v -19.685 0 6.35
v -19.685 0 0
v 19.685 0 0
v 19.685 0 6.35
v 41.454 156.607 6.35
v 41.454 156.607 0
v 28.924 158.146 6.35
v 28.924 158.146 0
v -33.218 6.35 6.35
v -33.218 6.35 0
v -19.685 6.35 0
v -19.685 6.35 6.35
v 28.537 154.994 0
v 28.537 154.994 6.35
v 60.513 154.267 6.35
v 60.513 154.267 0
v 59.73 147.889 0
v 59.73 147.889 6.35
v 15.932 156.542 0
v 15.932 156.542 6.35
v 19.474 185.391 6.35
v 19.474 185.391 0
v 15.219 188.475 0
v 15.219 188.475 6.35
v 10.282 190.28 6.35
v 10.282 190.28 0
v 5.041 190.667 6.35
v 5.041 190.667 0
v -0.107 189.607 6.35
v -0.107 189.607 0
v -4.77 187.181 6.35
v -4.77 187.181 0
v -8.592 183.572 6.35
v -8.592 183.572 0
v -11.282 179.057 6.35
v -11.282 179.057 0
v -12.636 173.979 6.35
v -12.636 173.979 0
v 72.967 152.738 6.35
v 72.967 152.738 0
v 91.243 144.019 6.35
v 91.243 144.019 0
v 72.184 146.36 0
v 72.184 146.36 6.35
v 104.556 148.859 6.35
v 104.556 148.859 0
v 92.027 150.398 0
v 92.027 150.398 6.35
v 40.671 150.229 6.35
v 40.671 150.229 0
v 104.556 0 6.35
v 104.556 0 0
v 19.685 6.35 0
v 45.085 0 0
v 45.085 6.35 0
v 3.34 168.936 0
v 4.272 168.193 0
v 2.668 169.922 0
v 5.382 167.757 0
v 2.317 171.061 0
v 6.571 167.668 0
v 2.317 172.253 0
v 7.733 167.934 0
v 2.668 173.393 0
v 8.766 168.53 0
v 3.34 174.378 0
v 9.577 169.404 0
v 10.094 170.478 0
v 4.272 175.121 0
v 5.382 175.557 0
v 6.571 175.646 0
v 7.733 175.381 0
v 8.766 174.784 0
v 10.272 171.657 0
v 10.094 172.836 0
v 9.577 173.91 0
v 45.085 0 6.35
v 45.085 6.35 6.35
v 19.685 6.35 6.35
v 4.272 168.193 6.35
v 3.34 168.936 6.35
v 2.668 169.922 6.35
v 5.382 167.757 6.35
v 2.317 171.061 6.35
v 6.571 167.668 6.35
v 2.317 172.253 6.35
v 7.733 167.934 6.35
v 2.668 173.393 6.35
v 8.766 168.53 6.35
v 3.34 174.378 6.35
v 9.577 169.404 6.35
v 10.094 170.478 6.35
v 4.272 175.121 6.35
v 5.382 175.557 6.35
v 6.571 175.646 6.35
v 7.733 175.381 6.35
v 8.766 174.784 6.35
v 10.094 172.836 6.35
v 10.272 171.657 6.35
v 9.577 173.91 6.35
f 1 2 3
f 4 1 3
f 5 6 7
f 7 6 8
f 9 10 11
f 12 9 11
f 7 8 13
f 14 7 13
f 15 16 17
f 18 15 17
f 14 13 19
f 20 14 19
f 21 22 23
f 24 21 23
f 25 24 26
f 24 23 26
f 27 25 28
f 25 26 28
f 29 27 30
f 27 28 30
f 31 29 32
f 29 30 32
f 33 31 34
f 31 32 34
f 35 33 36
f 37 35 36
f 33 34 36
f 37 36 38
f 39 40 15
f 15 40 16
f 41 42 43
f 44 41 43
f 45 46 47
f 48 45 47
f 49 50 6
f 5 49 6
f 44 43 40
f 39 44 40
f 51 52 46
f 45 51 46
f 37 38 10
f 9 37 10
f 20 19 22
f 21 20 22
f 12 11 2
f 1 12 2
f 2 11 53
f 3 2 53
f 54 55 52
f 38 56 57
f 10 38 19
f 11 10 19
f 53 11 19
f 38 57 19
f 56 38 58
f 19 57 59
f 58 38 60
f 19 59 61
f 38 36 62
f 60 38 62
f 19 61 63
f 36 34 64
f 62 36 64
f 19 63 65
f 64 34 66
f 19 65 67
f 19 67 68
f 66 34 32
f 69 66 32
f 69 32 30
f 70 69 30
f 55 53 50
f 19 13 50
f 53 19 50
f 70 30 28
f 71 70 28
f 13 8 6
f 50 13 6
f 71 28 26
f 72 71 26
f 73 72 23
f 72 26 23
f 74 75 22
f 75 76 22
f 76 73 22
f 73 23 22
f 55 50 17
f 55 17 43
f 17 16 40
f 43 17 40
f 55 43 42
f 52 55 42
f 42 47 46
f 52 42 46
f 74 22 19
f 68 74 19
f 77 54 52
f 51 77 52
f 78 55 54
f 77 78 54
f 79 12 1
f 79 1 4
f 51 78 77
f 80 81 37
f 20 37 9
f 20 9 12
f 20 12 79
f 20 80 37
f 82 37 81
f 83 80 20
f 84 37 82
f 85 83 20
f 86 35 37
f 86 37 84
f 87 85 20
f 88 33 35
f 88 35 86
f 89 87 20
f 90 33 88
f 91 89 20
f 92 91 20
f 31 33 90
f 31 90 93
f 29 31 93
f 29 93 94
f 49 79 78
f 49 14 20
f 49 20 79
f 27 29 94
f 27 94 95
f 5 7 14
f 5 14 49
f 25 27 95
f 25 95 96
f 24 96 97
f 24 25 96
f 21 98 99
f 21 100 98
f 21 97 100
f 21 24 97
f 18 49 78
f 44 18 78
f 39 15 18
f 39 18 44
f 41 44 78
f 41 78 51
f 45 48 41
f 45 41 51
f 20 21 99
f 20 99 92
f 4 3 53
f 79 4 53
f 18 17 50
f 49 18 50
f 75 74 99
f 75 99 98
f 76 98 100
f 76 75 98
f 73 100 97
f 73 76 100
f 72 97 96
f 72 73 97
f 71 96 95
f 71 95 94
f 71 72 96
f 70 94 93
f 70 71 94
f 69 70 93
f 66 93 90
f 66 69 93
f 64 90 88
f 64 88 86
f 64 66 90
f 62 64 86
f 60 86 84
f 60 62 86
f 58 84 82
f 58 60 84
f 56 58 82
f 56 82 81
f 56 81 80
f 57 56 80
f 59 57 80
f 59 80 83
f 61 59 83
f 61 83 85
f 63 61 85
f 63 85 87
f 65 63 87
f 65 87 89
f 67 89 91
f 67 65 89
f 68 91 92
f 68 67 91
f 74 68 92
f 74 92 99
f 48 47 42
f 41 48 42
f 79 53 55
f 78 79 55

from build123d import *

# Parameters (mm, degrees)
SKETCH1_R           = 4
BOSS_EXTRUDE1_DEPTH = 6.35


with BuildPart() as part:
    # Sketch1 → Boss-Extrude1 (new body)
    with BuildSketch(Plane.XY):
        with BuildLine():
            Line((15.931937103, 156.542159914), (19.474069569, 185.390513812))
            ThreePointArc((19.474069569, 185.390513812), (-0.107426276, 189.607166129), (-12.636025926, 173.978688048))
            Line((-12.636025926, 173.978688048), (-33.218240783, 6.35))
            Line((-33.218240783, 6.35), (-19.685, 6.35))
            Line((-19.685, 6.35), (-19.685, 0))
            Line((-19.685, 0), (0, 0))
            Line((0, 0), (19.685, 0))
            Line((19.685, 0), (19.685, 6.35))
            Line((19.685, 6.35), (45.085, 6.35))
            Line((45.085, 6.35), (45.085, 0))
            Line((45.085, 0), (104.55622515, 0))
            Line((104.55622515, 0), (104.55622515, 148.859309317))
            Line((104.55622515, 148.859309317), (92.026521041, 150.397763534))
            Line((92.026521041, 150.397763534), (91.243364266, 144.019463455))
            Line((91.243364266, 144.019463455), (72.184096044, 146.359647334))
            Line((72.184096044, 146.359647334), (72.967252818, 152.737947414))
            Line((72.967252818, 152.737947414), (60.513180726, 154.267115187))
            Line((60.513180726, 154.267115187), (59.730023951, 147.888815108))
            Line((59.730023951, 147.888815108), (40.670755729, 150.228998987))
            Line((40.670755729, 150.228998987), (41.453912504, 156.607299067))
            Line((41.453912504, 156.607299067), (28.924208395, 158.145753284))
            Line((28.924208395, 158.145753284), (28.537273229, 154.994419253))
            Line((28.537273229, 154.994419253), (15.931937103, 156.542159914))
        make_face()
        with Locations((6.271978263, 171.657077056)):
            Circle(SKETCH1_R, mode=Mode.SUBTRACT)
    extrude(amount=BOSS_EXTRUDE1_DEPTH)


solid = part.part
